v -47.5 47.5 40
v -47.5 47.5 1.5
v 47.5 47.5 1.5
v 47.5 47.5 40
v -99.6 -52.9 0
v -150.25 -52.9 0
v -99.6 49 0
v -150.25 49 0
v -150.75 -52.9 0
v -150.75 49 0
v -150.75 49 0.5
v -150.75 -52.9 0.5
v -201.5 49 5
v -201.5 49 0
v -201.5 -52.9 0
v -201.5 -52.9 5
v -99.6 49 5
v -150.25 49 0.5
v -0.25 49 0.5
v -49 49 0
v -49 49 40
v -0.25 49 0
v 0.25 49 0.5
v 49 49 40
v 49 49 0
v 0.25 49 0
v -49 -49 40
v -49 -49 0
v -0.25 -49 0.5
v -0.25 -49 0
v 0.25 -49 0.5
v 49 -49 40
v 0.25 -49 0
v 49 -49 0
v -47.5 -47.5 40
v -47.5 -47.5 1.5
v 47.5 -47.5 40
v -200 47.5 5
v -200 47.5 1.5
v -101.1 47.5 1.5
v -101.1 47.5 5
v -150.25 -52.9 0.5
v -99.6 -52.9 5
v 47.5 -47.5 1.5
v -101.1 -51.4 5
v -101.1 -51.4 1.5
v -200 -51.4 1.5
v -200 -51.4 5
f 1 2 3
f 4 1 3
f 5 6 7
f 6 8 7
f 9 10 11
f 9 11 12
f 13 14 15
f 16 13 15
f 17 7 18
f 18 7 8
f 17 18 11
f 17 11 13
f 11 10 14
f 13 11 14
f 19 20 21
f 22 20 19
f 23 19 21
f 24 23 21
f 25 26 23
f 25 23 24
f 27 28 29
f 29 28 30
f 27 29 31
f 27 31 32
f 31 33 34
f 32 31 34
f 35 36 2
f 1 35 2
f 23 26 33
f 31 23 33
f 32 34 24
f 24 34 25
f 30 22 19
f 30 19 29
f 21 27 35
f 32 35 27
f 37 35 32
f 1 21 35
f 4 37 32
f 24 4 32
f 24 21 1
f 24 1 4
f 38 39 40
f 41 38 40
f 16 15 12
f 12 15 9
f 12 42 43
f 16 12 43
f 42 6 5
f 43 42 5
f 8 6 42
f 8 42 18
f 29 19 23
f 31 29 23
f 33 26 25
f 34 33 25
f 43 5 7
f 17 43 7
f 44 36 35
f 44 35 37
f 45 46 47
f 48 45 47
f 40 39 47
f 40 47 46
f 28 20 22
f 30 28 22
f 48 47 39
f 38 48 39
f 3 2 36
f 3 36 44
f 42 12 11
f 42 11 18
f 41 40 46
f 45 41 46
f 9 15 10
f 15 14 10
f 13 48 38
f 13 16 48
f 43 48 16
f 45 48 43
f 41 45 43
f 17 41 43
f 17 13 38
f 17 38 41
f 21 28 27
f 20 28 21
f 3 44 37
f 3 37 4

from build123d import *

# Parameters (mm, degrees)
F0_W     = 98
F0_H     = 98
F0_W_2   = 95
F0_H_2   = 95
F2_DEPTH = 40
F3_DEPTH = 1.5
F1_W     = 49.25
F1_H     = 98.9
F1_W_2   = 0.5
F1_W_3   = 49.15
F4_DEPTH = 1.5
F1_H_2   = 1.5
F5_DEPTH = 5
F6_W     = 0.5
F6_H     = 98
F7_DEPTH = 0.5
F8_DEPTH = 0.5


with BuildPart() as f2:
    # F0 (on Top) → F2 (new body)
    with BuildSketch(Plane.XY):
        Rectangle(F0_W, F0_H)
        Rectangle(F0_W_2, F0_H_2, mode=Mode.SUBTRACT)
    extrude(amount=F2_DEPTH)

    # F0 (on Top) → F3 (join)
    with BuildSketch(Plane.XY):
        Rectangle(F0_W_2, F0_H_2)
    extrude(amount=F3_DEPTH)

    # F6 (on face) → F7 (cut)
    with BuildSketch(Plane(origin=(0, 0, 0), x_dir=(1, 0, 0), z_dir=(0, 0, -1))):
        Rectangle(F6_W, F6_H)
    extrude(amount=-F7_DEPTH, mode=Mode.SUBTRACT)


with BuildPart() as f4:
    # F1 (on Top) → F4 (new body)
    with BuildSketch(Plane.XY):
        with Locations((-175.375, -1.95)):
            Rectangle(F1_W, F1_H)
        with Locations((-150.5, -1.95)):
            Rectangle(F1_W_2, F1_H)
        with Locations((-125.675, -1.95)):
            Rectangle(F1_W_3, F1_H)
    extrude(amount=F4_DEPTH)

    # F1 (on Top) → F5 (join)
    with BuildSketch(Plane.XY):
        Polygon((-200, -51.4), (-200, 47.5), (-150.75, 47.5), (-150.75, 49), (-201.5, 49), (-201.5, -52.9), (-150.75, -52.9), (-150.75, -51.4), align=None)
        with Locations((-150.5, 48.25)):
            Rectangle(F1_W_2, F1_H_2)
        Polygon((-150.25, 49), (-150.25, 47.5), (-101.1, 47.5), (-101.1, -51.4), (-150.25, -51.4), (-150.25, -52.9), (-99.6, -52.9), (-99.6, 49), align=None)
        with Locations((-150.5, -52.15)):
            Rectangle(F1_W_2, F1_H_2)
    extrude(amount=F5_DEPTH)

    # F1 (on Top) → F8 (cut)
    with BuildSketch(Plane.XY):
        with Locations((-150.5, -1.95)):
            Rectangle(F1_W_2, F1_H)
        with Locations((-150.5, -52.15)):
            Rectangle(F1_W_2, F1_H_2)
        with Locations((-150.5, 48.25)):
            Rectangle(F1_W_2, F1_H_2)
    extrude(amount=F8_DEPTH, mode=Mode.SUBTRACT)


solid = Compound([f2.part, f4.part])
